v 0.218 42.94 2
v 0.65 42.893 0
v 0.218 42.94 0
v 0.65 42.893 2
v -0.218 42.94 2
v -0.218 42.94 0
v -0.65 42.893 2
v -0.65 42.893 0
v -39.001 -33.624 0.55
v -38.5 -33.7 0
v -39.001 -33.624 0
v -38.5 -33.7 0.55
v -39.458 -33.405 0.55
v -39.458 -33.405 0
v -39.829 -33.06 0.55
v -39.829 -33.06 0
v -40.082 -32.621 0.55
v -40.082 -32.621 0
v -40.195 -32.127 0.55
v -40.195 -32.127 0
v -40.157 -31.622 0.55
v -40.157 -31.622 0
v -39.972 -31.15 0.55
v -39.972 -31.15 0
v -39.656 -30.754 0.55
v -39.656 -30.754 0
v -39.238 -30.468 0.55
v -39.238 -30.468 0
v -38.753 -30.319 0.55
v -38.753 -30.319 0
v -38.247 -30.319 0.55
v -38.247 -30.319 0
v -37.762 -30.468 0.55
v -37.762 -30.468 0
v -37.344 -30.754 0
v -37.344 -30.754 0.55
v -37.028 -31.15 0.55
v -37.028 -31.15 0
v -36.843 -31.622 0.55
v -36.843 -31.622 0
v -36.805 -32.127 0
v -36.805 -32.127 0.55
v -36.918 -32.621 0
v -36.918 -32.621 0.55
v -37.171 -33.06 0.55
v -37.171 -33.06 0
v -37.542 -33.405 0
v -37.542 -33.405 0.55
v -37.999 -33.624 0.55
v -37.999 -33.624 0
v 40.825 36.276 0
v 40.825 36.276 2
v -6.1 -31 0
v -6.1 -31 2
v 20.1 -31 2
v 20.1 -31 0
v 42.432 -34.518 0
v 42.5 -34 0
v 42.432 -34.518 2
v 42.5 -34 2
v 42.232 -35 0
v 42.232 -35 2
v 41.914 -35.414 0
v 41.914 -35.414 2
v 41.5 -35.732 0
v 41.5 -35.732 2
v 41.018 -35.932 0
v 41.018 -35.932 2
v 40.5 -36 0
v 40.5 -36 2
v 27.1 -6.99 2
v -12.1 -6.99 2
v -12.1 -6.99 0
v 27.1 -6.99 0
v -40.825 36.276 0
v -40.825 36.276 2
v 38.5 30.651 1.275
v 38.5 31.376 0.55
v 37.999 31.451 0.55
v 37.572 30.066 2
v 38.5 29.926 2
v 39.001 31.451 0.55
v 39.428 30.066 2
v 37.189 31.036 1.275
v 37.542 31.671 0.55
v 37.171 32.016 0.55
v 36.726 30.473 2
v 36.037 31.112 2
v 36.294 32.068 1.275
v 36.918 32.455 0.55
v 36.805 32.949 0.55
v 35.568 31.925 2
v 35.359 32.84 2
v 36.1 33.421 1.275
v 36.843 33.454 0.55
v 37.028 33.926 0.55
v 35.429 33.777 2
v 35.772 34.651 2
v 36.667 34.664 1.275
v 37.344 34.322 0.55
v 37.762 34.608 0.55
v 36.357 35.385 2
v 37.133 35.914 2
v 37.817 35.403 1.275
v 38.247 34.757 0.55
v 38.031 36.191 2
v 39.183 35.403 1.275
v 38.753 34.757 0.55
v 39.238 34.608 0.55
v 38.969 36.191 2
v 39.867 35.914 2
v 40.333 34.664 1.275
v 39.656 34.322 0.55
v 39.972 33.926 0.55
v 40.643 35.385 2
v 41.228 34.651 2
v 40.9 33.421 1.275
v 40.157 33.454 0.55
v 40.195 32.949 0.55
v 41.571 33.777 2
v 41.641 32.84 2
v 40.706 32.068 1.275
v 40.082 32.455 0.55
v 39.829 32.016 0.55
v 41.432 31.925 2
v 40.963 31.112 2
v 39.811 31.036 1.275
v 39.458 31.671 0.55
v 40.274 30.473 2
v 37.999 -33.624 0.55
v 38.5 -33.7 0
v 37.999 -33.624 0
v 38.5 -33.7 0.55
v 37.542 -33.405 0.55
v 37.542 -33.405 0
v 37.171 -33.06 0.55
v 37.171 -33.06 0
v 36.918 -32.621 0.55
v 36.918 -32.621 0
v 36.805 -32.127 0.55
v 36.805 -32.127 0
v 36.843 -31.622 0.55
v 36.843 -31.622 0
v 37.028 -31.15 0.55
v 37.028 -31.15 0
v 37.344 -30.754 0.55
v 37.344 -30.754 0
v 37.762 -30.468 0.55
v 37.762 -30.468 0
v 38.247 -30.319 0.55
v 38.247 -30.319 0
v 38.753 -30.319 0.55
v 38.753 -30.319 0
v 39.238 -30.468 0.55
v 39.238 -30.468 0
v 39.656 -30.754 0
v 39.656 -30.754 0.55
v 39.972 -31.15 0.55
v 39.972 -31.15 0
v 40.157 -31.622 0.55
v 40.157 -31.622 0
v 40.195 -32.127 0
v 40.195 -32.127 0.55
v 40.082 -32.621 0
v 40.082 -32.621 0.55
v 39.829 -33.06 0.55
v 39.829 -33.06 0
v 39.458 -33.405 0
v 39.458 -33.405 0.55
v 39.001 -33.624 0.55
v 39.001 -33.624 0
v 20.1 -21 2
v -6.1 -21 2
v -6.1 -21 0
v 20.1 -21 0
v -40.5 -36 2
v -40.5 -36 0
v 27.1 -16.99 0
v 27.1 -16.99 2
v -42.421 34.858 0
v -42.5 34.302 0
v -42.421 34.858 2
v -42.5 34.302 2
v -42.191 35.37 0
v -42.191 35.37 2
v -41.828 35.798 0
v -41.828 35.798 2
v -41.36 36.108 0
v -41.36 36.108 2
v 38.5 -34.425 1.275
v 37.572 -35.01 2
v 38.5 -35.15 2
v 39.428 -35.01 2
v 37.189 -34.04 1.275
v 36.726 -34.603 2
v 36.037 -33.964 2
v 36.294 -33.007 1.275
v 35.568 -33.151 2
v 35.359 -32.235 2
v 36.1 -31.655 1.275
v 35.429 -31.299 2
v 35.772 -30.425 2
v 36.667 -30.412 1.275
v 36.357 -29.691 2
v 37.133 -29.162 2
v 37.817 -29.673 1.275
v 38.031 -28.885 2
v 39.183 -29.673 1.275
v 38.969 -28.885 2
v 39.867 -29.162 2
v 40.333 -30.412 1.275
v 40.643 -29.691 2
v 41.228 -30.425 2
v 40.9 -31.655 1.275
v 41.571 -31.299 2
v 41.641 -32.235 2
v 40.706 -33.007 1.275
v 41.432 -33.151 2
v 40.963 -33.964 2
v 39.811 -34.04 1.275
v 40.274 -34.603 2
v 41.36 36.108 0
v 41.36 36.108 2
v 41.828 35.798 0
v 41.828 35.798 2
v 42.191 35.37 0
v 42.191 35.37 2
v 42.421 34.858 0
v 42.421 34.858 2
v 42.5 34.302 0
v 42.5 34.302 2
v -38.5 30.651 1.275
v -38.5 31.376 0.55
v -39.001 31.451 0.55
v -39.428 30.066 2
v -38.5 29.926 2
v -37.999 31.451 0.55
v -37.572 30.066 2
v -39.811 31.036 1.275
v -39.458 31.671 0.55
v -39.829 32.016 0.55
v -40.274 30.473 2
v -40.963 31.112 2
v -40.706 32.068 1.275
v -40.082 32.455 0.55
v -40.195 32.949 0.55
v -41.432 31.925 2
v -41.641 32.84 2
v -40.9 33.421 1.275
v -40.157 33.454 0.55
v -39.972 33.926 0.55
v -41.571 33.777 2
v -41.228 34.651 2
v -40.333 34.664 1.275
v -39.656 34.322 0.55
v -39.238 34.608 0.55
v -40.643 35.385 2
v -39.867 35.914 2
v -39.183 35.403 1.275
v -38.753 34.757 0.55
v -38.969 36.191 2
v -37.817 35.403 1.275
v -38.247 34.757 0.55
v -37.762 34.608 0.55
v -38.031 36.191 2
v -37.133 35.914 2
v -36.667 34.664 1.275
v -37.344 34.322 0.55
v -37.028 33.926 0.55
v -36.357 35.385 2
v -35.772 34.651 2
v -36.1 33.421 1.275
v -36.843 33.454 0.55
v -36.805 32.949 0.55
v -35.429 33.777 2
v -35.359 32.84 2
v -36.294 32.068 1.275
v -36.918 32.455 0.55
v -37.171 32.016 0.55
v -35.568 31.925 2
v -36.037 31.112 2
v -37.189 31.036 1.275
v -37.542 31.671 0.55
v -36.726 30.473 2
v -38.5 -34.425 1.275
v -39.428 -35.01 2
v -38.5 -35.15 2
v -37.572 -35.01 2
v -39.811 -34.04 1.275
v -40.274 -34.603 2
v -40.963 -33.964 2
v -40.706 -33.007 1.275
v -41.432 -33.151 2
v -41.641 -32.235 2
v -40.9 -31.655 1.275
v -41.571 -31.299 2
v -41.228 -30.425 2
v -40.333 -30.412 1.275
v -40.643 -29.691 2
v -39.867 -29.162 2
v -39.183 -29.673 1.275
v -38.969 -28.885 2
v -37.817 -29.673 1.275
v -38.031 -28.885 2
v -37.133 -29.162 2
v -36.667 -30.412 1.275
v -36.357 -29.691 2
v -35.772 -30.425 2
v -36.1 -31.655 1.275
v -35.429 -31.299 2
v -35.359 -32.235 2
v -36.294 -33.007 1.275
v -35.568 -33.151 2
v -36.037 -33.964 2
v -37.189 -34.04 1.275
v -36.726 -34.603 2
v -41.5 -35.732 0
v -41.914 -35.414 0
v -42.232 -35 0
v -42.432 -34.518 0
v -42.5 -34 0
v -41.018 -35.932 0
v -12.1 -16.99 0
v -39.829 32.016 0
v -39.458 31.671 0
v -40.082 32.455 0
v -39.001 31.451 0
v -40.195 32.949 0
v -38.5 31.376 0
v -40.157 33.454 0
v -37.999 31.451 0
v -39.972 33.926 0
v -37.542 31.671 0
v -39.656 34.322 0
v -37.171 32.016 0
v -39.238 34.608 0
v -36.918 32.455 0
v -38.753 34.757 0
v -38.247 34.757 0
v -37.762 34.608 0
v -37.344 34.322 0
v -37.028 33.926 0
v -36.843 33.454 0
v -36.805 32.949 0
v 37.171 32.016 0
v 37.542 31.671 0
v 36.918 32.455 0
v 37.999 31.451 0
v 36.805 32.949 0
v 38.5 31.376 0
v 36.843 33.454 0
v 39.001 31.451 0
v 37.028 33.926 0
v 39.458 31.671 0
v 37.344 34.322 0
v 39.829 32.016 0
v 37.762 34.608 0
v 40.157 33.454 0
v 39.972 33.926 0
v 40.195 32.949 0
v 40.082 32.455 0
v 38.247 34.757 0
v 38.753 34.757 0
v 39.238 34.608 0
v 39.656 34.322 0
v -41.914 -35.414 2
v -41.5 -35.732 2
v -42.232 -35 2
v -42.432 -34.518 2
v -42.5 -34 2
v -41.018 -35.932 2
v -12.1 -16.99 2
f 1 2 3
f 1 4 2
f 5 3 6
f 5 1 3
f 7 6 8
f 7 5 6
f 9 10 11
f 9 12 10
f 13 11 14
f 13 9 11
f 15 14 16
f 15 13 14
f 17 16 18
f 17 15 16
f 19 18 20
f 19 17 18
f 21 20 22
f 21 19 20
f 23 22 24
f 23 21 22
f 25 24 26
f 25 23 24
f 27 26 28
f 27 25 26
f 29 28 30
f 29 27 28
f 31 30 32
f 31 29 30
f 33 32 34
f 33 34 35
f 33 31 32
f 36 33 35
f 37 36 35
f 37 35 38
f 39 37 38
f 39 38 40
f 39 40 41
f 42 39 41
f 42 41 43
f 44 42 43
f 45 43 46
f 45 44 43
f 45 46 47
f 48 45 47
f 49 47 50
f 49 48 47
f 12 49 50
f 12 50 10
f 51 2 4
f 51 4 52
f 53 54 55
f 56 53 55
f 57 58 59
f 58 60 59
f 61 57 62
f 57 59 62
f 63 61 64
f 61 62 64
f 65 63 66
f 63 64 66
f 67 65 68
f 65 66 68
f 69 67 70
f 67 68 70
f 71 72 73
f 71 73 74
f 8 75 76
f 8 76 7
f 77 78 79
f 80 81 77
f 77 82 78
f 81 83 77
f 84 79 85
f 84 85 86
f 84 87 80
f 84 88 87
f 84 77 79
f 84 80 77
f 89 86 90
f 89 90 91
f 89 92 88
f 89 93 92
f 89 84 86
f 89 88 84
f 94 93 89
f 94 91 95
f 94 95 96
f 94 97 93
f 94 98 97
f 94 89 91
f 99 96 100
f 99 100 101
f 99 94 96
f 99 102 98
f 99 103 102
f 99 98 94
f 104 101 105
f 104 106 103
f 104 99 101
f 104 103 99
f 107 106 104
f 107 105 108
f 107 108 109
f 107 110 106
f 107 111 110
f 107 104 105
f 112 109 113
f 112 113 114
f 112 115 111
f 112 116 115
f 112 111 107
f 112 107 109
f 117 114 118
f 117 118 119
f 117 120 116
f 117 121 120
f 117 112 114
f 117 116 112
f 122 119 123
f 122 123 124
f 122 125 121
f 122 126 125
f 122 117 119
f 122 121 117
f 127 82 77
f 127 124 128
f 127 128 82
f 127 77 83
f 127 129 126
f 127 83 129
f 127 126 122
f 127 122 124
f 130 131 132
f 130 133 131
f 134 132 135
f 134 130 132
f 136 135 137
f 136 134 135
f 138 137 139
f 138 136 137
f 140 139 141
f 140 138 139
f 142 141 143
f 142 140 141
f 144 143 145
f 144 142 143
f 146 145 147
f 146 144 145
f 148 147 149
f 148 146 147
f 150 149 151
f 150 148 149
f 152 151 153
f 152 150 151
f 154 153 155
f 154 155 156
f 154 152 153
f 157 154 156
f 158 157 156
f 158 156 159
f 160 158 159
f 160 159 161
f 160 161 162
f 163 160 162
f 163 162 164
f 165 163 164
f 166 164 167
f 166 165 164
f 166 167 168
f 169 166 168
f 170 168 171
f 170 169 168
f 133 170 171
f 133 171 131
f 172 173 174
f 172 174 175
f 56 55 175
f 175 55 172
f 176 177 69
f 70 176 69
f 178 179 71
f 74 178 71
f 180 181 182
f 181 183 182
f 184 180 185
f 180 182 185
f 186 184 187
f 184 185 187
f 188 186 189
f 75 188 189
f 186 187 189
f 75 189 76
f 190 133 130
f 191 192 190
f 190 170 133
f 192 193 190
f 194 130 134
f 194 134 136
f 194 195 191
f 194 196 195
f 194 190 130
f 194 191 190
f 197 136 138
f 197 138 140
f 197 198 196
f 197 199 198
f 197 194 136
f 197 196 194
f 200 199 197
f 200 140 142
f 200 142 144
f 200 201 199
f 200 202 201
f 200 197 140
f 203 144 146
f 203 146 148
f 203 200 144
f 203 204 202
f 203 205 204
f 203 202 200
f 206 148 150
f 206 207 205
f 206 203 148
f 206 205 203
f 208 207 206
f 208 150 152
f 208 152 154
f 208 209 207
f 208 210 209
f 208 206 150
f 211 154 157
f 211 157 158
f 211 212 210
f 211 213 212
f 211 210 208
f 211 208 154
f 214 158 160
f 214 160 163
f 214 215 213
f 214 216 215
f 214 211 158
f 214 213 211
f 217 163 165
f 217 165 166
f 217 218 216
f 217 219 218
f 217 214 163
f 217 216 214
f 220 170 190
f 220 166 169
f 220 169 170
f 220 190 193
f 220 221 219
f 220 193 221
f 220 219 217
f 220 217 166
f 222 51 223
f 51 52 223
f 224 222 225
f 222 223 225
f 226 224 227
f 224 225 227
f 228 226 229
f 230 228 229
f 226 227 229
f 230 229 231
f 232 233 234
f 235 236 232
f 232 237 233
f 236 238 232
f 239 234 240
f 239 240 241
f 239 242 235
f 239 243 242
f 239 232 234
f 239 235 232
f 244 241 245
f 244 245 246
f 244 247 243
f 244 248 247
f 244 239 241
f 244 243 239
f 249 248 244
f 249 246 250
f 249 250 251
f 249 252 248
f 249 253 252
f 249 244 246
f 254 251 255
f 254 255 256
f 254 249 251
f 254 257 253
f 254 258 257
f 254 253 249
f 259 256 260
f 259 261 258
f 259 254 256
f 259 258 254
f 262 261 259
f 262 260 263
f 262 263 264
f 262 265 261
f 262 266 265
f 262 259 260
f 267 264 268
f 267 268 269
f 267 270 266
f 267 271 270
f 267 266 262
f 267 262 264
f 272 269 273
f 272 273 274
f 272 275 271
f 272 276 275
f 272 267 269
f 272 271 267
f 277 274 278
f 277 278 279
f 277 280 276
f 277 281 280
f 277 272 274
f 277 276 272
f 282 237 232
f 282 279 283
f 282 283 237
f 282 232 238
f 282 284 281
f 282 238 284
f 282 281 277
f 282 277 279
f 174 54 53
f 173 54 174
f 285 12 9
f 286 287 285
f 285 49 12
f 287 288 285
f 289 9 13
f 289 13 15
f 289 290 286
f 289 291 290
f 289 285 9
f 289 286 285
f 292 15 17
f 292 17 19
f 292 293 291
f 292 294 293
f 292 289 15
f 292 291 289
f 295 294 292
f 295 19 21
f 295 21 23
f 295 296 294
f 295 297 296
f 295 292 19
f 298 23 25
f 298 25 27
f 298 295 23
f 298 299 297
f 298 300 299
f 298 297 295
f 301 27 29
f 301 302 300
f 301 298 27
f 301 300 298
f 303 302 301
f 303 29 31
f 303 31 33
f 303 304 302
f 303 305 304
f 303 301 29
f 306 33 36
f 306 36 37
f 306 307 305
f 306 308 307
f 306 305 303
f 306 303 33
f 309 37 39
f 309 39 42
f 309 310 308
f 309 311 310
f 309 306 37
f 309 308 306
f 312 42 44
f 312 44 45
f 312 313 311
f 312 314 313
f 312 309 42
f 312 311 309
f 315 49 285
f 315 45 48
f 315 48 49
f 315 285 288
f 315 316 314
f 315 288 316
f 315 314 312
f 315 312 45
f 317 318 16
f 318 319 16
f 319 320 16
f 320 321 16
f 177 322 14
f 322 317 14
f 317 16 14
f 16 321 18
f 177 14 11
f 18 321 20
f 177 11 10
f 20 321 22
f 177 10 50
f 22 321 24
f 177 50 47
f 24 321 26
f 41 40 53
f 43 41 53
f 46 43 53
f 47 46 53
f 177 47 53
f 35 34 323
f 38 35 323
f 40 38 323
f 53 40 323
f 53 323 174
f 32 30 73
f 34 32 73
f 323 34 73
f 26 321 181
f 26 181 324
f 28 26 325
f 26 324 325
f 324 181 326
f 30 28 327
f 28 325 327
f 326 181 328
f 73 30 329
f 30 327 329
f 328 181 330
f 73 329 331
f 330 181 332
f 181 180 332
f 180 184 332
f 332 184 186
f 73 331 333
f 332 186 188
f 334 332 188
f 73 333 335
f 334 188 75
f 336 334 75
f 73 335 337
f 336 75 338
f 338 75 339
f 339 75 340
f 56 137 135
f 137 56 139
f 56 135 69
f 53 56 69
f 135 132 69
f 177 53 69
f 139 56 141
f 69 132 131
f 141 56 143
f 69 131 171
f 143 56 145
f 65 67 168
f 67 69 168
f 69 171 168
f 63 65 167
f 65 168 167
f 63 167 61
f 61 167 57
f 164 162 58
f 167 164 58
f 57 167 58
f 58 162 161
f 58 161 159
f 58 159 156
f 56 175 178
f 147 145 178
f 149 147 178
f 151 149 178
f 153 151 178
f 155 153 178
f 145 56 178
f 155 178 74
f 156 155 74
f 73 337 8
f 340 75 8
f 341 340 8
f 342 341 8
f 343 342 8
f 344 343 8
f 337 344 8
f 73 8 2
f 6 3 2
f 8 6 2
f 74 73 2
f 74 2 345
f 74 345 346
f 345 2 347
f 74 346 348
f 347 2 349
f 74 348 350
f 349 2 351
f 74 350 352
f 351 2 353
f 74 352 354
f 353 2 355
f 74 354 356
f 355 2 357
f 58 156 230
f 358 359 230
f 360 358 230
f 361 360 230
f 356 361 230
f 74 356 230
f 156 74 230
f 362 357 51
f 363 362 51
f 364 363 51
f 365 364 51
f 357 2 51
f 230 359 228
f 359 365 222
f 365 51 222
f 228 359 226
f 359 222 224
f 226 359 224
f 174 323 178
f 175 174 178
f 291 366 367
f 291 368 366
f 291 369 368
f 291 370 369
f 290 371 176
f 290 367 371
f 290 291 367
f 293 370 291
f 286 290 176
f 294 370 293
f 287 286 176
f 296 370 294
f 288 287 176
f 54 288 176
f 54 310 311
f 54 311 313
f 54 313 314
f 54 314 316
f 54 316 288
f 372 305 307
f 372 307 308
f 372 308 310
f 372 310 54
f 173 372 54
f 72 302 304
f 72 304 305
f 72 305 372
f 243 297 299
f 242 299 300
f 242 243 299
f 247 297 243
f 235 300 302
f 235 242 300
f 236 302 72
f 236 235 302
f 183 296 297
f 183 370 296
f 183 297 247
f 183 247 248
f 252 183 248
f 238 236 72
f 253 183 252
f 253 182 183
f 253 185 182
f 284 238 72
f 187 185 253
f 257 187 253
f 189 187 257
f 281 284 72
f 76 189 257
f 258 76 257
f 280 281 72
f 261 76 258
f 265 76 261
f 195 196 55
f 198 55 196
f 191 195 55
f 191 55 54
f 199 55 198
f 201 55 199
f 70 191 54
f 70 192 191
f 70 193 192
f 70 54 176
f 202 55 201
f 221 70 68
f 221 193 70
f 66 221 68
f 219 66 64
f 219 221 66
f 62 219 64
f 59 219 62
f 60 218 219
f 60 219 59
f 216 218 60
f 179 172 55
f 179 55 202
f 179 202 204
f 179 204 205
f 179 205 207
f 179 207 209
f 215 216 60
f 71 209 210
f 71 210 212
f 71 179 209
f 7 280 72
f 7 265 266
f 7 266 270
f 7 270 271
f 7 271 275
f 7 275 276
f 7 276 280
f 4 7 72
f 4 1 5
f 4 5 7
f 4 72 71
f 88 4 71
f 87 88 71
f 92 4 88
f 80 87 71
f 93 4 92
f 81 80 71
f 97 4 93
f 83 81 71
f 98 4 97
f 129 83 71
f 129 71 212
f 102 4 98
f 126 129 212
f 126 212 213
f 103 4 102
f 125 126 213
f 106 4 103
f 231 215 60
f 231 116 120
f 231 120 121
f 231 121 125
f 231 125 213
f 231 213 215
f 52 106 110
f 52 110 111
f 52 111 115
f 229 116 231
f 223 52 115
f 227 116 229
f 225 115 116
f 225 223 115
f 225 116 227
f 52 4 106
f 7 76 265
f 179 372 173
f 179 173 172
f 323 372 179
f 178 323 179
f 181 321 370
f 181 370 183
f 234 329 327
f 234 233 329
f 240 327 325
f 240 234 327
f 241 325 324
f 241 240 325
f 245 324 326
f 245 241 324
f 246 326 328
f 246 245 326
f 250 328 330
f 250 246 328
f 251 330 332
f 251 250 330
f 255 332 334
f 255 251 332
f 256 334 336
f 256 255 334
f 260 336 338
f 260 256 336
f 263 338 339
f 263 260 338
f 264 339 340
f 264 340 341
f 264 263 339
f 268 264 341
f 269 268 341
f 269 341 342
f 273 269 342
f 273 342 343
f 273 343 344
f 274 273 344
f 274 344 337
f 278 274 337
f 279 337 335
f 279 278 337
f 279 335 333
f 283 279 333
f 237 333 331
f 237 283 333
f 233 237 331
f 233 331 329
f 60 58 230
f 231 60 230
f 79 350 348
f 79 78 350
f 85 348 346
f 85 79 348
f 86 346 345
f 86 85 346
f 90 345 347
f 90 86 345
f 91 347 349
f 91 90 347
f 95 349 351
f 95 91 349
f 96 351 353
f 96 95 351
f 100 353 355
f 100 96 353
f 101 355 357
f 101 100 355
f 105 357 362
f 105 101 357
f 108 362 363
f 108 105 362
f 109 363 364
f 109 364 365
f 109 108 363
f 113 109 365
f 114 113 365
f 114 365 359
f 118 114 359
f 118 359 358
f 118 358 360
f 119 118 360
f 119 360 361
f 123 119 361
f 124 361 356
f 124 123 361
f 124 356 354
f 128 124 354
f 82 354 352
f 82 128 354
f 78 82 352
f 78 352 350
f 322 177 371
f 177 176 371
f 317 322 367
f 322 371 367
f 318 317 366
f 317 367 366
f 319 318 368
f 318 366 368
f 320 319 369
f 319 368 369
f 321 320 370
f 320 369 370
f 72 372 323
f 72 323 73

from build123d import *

# Parameters (mm, degrees)
SCHIZZO1_W                            = 85
SCHIZZO1_H                            = 72
ESTRUSIONE_ESTRUSIONE1_DEPTH          = 2
RACCORDO1_R                           = 4
RACCORDO3_R                           = 2
RACCORDO4_R                           = 2
RACCORDO5_R                           = 2
RACCORDO6_R                           = 2
TAGLIO_ESTRUSIONE1_REACH              = 62.453
SCHIZZO2_W                            = 39.2
SCHIZZO2_H                            = 10
SCHIZZO2_W_2                          = 26.2
FORO_SVASATO_PER_VITE_M3_1_AT_2_COUNT = 2
FORO_SVASATO_PER_VITE_M3_1_AT_2_PITCH = 65.075876997
FORO_SVASATO_PER_VITE_M3_1_AT_3_COUNT = 2
FORO_SVASATO_PER_VITE_M3_1_AT_3_PITCH = 100.816019396
FORO_SVASATO_PER_VITE_M3_1_AT_4_COUNT = 2
FORO_SVASATO_PER_VITE_M3_1_AT_4_PITCH = 77


with BuildPart() as part:
    # Schizzo1 → Estrusione-Estrusione1 (new body)
    with BuildSketch(Plane.XY):
        Rectangle(SCHIZZO1_W, SCHIZZO1_H)
        Polygon((0, 43), (42.5, 36), (-42.5, 36), align=None)
    extrude(amount=ESTRUSIONE_ESTRUSIONE1_DEPTH)

    # Raccordo1
    raccordo1_edges = [part.edges().sort_by_distance(p)[0] for p in [
        (0, 43, 1),
    ]]
    fillet(raccordo1_edges, radius=RACCORDO1_R)

    # Raccordo3
    raccordo3_edges = [part.edges().sort_by_distance(p)[0] for p in [
        (42.5, 36, 1),
    ]]
    fillet(raccordo3_edges, radius=RACCORDO3_R)

    # Raccordo4
    raccordo4_edges = [part.edges().sort_by_distance(p)[0] for p in [
        (42.5, -36, 1),
    ]]
    fillet(raccordo4_edges, radius=RACCORDO4_R)

    # Raccordo5
    raccordo5_edges = [part.edges().sort_by_distance(p)[0] for p in [
        (-42.5, -36, 1),
    ]]
    fillet(raccordo5_edges, radius=RACCORDO5_R)

    # Raccordo6
    raccordo6_edges = [part.edges().sort_by_distance(p)[0] for p in [
        (-42.5, 36, 1),
    ]]
    fillet(raccordo6_edges, radius=RACCORDO6_R)

    # Schizzo2 → Taglio-Estrusione1 (cut, up to next)
    with BuildSketch(Plane.XY.offset(2), mode=Mode.PRIVATE) as taglio_estrusione1_sk1:
        with Locations((7.5, -11.99)):
            Rectangle(SCHIZZO2_W, SCHIZZO2_H)
    taglio_estrusione1_tool1 = extrude(taglio_estrusione1_sk1.sketch, amount=-TAGLIO_ESTRUSIONE1_REACH, mode=Mode.PRIVATE) & part.part
    # Schizzo2 → Taglio-Estrusione1 (cut, up to next)
    with BuildSketch(Plane.XY.offset(2), mode=Mode.PRIVATE) as taglio_estrusione1_sk2:
        with Locations((7, -26)):
            Rectangle(SCHIZZO2_W_2, SCHIZZO2_H)
    taglio_estrusione1_tool2 = extrude(taglio_estrusione1_sk2.sketch, amount=-TAGLIO_ESTRUSIONE1_REACH, mode=Mode.PRIVATE) & part.part
    add(taglio_estrusione1_tool1.solids().sort_by_distance((7.5, -11.99, 2))[0], mode=Mode.SUBTRACT)
    add(taglio_estrusione1_tool2.solids().sort_by_distance((7, -26, 2))[0], mode=Mode.SUBTRACT)

    # Schizzo4 → Foro svasato per Vite M3-1 (revolve, cut)
    with BuildSketch(Plane(origin=(-38.5, 33.075876997, 2), x_dir=(0, -1, 0), z_dir=(1, 0, 0))):
        Polygon((0, 0), (0, 2), (1.7, 2), (1.7, 1.45), (3.15, 0), align=None)
    foro_svasato_per_vite_m3_1 = revolve(axis=Axis((-38.5, 33.075876997, 8.35), (0, 0, -1)), mode=Mode.SUBTRACT)

    # Foro svasato per Vite M3-1 at 2: Foro svasato per Vite M3-1 ×2
    with Locations(*[(0, -i * FORO_SVASATO_PER_VITE_M3_1_AT_2_PITCH, 0) for i in range(1, FORO_SVASATO_PER_VITE_M3_1_AT_2_COUNT)]):
        add(foro_svasato_per_vite_m3_1, mode=Mode.SUBTRACT)

    # Foro svasato per Vite M3-1 at 3: Foro svasato per Vite M3-1 ×2
    with Locations(*[Vector(0.7637675089853256, -0.6454914346591678, 0) * (i * FORO_SVASATO_PER_VITE_M3_1_AT_3_PITCH) for i in range(1, FORO_SVASATO_PER_VITE_M3_1_AT_3_COUNT)]):
        add(foro_svasato_per_vite_m3_1, mode=Mode.SUBTRACT)

    # Foro svasato per Vite M3-1 at 4: Foro svasato per Vite M3-1 ×2
    with Locations(*[(i * FORO_SVASATO_PER_VITE_M3_1_AT_4_PITCH, 0, 0) for i in range(1, FORO_SVASATO_PER_VITE_M3_1_AT_4_COUNT)]):
        add(foro_svasato_per_vite_m3_1, mode=Mode.SUBTRACT)


solid = part.part
